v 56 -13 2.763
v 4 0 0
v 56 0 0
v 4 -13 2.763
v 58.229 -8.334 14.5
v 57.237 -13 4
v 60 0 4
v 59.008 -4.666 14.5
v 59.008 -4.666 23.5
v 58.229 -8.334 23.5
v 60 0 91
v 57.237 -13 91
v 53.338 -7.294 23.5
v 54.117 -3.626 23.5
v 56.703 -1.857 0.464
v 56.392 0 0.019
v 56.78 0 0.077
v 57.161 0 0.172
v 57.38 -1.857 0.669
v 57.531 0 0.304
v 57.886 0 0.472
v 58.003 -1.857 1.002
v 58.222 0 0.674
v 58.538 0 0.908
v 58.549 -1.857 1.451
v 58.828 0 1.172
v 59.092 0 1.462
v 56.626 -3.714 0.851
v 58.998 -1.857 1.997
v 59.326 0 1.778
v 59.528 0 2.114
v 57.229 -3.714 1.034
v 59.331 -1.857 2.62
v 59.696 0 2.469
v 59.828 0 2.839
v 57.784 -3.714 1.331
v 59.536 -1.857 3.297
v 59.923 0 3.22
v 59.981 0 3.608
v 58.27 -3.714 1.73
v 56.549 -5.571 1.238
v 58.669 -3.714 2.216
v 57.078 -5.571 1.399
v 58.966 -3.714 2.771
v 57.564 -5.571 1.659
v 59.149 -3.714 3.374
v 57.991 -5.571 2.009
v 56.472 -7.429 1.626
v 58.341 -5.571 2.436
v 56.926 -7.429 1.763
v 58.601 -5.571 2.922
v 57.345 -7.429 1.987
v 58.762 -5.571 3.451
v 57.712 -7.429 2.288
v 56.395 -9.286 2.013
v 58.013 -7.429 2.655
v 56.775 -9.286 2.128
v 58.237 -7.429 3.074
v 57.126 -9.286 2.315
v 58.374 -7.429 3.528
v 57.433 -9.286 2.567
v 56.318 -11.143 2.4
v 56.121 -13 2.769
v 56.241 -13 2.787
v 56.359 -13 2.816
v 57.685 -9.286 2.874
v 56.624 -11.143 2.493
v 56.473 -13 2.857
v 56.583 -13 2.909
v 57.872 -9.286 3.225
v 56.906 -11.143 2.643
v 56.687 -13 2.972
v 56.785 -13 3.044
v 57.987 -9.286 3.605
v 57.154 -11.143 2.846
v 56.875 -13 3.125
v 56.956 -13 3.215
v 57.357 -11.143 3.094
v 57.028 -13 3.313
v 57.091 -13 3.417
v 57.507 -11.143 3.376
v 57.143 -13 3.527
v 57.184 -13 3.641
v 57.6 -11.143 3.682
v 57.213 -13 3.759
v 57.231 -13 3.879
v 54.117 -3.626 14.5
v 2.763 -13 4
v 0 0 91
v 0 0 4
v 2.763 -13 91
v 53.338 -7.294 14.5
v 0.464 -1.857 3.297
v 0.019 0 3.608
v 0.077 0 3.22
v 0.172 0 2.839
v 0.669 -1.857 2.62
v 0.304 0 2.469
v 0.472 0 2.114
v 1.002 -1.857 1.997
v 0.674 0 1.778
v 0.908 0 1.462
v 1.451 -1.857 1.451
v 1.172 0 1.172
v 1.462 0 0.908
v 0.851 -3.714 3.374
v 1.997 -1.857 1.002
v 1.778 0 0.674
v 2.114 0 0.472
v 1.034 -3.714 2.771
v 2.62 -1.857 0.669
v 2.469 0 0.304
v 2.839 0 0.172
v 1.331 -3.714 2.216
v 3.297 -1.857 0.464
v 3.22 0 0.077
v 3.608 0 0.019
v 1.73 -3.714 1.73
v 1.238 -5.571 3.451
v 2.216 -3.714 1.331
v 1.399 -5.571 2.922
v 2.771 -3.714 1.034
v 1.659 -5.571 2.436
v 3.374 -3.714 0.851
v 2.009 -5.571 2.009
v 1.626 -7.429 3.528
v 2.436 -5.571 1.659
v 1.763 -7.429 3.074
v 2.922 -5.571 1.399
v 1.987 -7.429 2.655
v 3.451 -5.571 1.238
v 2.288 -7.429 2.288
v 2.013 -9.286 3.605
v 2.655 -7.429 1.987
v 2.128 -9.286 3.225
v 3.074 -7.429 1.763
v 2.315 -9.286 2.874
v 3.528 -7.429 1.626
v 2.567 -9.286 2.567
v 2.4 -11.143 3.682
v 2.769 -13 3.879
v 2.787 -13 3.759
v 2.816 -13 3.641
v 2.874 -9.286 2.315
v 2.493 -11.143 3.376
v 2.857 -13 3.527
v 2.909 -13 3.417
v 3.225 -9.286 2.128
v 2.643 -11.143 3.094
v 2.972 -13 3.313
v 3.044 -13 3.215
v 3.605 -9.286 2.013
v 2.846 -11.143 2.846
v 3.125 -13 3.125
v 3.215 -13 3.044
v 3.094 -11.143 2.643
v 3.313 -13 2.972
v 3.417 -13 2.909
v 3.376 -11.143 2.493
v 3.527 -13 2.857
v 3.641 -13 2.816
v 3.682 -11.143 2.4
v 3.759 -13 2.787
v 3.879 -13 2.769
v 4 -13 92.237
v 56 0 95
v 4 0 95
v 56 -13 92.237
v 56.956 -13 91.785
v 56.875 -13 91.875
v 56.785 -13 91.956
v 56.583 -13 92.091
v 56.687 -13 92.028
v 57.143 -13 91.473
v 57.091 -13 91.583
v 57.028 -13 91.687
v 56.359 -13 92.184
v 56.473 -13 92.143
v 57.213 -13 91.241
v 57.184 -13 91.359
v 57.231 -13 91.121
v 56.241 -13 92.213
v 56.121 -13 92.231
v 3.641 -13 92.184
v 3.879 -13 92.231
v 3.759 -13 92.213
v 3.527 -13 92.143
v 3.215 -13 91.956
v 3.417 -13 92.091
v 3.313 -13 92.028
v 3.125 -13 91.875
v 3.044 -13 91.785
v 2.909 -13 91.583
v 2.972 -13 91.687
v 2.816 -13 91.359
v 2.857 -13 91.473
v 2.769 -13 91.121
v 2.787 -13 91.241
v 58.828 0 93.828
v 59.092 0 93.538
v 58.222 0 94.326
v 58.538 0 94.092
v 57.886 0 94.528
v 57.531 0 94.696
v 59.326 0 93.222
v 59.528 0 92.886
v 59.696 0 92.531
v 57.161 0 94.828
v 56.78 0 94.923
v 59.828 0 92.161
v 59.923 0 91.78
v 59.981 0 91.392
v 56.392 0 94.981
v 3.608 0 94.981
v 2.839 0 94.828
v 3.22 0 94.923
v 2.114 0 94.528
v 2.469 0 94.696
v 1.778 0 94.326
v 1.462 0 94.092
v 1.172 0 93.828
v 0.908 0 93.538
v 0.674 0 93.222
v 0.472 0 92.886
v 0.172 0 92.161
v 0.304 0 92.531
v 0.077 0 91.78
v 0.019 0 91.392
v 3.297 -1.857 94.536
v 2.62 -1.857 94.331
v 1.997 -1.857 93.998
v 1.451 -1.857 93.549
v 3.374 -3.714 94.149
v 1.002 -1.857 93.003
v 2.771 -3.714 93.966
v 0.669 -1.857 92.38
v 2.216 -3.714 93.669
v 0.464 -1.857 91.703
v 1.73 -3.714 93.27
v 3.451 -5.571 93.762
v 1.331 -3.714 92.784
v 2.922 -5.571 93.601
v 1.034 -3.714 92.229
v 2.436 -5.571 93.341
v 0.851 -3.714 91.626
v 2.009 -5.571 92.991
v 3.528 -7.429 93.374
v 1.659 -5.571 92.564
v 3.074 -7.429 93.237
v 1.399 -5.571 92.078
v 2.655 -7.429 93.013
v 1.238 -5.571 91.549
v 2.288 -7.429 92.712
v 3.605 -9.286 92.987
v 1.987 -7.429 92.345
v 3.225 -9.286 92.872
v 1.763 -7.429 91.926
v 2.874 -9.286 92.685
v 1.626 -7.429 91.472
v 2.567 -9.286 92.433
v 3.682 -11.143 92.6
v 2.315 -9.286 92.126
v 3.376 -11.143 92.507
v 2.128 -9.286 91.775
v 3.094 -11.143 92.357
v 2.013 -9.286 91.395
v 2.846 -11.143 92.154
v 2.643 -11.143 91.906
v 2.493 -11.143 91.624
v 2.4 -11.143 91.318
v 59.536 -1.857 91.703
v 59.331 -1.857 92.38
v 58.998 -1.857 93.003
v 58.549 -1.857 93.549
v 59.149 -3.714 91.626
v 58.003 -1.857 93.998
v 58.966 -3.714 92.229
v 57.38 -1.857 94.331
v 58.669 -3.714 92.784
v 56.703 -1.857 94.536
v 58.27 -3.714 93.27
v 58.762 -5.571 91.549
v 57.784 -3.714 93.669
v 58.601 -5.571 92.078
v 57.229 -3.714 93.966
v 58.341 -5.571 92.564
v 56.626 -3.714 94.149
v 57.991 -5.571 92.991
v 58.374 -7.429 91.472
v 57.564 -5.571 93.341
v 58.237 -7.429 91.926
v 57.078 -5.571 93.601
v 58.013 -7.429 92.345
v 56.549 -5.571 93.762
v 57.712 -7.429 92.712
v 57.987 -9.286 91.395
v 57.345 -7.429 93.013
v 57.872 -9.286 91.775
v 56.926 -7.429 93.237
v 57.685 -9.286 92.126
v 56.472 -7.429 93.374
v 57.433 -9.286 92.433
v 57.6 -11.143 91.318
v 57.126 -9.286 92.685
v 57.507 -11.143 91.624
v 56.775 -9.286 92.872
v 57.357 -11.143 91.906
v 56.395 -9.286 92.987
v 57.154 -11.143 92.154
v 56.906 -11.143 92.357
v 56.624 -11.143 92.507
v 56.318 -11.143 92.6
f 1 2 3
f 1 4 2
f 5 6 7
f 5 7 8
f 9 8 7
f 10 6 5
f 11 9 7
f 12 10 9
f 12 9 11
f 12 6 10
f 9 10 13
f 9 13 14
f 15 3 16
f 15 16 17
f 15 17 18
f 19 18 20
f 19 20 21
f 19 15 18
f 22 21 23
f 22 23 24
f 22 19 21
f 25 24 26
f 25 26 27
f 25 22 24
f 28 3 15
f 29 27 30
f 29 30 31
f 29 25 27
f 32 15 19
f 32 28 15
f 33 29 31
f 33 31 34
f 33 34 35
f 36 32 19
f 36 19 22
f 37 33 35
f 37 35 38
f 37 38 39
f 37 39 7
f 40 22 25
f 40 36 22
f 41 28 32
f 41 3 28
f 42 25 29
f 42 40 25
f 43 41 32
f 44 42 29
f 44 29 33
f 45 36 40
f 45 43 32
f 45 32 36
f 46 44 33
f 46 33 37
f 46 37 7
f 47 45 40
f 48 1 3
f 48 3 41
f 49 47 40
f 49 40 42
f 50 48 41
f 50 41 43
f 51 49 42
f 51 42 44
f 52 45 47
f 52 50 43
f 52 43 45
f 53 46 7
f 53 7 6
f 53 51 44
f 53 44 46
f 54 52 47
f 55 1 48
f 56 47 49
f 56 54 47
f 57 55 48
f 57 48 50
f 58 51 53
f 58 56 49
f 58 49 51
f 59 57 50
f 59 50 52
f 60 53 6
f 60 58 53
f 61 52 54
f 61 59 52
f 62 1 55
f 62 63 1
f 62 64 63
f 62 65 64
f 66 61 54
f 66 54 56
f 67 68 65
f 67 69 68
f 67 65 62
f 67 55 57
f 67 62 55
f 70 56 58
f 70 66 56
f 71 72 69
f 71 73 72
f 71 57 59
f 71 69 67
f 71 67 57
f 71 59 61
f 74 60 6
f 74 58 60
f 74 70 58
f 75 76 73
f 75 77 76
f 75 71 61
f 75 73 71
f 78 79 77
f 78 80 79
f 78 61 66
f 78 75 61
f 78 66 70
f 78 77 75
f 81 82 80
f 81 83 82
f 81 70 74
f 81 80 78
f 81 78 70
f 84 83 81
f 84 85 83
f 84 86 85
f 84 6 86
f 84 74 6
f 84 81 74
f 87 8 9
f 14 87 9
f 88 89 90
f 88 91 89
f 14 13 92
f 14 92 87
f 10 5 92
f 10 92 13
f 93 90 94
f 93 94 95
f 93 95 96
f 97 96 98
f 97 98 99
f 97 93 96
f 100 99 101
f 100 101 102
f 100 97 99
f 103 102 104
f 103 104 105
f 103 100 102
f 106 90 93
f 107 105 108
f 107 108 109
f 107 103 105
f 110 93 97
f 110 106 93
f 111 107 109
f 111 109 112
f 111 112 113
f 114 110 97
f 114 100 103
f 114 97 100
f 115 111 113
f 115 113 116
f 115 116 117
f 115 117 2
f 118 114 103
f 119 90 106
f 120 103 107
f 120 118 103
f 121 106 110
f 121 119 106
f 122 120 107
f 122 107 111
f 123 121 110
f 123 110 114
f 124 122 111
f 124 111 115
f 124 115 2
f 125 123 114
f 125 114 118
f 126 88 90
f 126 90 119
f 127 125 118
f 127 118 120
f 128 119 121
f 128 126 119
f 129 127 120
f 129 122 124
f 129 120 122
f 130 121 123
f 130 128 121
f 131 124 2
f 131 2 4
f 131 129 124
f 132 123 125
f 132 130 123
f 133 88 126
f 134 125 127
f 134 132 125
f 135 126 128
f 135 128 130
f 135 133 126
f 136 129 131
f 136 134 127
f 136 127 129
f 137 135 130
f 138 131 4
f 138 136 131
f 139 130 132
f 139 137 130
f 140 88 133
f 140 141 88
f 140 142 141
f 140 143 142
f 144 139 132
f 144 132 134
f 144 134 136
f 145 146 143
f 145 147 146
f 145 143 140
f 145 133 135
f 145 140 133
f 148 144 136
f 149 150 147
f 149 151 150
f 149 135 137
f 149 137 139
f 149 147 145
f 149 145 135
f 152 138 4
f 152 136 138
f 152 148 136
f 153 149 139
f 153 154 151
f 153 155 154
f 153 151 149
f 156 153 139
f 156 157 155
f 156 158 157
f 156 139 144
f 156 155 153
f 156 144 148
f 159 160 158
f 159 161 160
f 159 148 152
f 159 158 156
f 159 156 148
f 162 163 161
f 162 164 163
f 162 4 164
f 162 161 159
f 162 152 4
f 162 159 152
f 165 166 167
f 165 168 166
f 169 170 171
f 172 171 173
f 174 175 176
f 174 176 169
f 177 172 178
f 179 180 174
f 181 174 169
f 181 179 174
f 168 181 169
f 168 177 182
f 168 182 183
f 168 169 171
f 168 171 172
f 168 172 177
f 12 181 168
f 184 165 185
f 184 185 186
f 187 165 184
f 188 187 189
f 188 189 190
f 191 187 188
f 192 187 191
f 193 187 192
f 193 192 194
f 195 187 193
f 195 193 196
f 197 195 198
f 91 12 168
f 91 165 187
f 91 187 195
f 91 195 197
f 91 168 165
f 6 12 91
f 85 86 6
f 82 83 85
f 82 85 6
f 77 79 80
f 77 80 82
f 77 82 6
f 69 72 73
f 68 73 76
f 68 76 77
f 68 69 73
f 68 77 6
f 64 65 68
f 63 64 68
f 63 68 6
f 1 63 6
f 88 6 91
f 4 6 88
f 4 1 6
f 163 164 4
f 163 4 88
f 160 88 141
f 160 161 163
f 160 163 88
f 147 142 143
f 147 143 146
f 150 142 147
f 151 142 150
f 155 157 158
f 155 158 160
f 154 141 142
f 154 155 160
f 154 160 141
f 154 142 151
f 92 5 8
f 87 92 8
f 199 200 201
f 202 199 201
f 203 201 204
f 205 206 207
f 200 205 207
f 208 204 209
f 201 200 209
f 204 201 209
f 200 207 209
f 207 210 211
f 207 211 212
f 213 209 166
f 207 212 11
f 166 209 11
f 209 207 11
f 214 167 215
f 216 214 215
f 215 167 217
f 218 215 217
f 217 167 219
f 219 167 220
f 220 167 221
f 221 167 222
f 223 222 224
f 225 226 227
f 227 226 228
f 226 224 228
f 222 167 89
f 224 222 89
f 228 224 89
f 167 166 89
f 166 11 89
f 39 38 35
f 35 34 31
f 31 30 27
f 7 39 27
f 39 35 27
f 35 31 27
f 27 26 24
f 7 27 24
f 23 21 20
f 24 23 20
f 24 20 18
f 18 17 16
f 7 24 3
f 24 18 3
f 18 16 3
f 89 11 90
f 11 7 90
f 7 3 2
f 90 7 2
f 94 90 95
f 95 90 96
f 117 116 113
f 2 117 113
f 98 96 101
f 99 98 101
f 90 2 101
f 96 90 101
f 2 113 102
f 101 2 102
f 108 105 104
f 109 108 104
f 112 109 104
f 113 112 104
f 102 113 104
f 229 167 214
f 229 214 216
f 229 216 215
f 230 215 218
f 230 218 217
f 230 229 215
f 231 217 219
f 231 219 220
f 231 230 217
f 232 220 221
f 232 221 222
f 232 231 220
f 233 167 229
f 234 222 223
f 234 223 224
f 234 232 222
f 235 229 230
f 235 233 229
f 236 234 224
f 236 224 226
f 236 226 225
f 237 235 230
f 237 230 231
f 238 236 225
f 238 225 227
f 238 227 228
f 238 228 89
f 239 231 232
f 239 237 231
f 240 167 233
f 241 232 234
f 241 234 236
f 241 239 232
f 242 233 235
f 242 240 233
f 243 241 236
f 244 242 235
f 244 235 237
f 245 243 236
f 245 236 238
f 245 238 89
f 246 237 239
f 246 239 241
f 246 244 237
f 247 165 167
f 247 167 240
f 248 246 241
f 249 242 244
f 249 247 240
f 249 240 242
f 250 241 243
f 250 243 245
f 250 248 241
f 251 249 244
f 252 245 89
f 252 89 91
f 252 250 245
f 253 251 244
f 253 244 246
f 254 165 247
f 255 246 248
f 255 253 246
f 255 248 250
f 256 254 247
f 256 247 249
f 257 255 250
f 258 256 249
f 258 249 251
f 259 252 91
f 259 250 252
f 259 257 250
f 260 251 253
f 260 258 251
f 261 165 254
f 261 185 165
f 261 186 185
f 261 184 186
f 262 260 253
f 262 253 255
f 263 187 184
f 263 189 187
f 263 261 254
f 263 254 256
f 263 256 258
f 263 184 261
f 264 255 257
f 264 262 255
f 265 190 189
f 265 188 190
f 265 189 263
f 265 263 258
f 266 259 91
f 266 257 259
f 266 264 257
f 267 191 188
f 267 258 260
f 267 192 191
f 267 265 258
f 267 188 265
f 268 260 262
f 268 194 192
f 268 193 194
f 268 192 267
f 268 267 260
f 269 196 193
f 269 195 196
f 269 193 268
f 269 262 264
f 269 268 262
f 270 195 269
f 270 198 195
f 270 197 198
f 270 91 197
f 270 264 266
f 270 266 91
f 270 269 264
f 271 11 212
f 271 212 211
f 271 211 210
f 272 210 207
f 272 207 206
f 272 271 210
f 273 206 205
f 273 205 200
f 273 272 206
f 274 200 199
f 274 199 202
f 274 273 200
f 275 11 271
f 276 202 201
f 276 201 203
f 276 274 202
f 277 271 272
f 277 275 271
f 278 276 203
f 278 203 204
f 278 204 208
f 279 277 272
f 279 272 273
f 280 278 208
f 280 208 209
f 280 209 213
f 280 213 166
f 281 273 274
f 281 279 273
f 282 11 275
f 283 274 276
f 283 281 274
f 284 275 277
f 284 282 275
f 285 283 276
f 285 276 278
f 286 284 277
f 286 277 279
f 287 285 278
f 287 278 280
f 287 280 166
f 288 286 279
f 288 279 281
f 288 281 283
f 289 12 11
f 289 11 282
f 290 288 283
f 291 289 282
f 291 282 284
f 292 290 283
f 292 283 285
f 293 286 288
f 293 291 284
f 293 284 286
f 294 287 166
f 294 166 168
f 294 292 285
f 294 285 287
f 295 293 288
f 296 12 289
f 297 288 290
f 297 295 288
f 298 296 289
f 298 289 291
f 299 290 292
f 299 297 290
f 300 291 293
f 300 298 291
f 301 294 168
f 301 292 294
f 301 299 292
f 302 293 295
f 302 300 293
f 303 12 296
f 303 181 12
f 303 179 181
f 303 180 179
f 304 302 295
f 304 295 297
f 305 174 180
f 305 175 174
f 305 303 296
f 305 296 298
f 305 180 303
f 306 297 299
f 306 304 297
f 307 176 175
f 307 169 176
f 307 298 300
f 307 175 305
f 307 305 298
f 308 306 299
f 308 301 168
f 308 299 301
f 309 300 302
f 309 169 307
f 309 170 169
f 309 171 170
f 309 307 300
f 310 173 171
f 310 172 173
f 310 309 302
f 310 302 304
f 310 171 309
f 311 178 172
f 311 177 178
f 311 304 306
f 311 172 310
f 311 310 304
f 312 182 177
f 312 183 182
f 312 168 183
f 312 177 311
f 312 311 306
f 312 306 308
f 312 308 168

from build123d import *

# Parameters (mm, degrees)
F3_DEPTH = 13
F3_TAPER = 12
F1_W     = 3.75
F1_H     = 9
F2_DEPTH = 5


with BuildPart() as f3:
    # F0 (on Front) → F3 (new body)
    with BuildSketch(Plane.XZ):
        with BuildLine():
            ThreePointArc((0, 4), (1.1715728753, 1.1715728753), (4, 0))
            Line((4, 0), (56, 0))
            ThreePointArc((56, 0), (58.8284271247, 1.1715728753), (60, 4))
            Line((60, 4), (60, 91))
            ThreePointArc((60, 91), (58.8284271247, 93.8284271247), (56, 95))
            Line((56, 95), (4, 95))
            ThreePointArc((4, 95), (1.1715728753, 93.8284271247), (0, 91))
            Line((0, 91), (0, 4))
        make_face()
    extrude(amount=F3_DEPTH, taper=F3_TAPER)

    # F1 (on face) → F2 (cut)
    with BuildSketch(Plane(origin=(57.4063637293, -12.2020992923, 0), x_dir=(0.2079116908, 0.9781476007, 0), z_dir=(0.9781476007, -0.2079116908, 0))):
        with Locations((5.8294875824, 19)):
            Rectangle(F1_W, F1_H)
    extrude(amount=-F2_DEPTH, mode=Mode.SUBTRACT)


solid = f3.part
